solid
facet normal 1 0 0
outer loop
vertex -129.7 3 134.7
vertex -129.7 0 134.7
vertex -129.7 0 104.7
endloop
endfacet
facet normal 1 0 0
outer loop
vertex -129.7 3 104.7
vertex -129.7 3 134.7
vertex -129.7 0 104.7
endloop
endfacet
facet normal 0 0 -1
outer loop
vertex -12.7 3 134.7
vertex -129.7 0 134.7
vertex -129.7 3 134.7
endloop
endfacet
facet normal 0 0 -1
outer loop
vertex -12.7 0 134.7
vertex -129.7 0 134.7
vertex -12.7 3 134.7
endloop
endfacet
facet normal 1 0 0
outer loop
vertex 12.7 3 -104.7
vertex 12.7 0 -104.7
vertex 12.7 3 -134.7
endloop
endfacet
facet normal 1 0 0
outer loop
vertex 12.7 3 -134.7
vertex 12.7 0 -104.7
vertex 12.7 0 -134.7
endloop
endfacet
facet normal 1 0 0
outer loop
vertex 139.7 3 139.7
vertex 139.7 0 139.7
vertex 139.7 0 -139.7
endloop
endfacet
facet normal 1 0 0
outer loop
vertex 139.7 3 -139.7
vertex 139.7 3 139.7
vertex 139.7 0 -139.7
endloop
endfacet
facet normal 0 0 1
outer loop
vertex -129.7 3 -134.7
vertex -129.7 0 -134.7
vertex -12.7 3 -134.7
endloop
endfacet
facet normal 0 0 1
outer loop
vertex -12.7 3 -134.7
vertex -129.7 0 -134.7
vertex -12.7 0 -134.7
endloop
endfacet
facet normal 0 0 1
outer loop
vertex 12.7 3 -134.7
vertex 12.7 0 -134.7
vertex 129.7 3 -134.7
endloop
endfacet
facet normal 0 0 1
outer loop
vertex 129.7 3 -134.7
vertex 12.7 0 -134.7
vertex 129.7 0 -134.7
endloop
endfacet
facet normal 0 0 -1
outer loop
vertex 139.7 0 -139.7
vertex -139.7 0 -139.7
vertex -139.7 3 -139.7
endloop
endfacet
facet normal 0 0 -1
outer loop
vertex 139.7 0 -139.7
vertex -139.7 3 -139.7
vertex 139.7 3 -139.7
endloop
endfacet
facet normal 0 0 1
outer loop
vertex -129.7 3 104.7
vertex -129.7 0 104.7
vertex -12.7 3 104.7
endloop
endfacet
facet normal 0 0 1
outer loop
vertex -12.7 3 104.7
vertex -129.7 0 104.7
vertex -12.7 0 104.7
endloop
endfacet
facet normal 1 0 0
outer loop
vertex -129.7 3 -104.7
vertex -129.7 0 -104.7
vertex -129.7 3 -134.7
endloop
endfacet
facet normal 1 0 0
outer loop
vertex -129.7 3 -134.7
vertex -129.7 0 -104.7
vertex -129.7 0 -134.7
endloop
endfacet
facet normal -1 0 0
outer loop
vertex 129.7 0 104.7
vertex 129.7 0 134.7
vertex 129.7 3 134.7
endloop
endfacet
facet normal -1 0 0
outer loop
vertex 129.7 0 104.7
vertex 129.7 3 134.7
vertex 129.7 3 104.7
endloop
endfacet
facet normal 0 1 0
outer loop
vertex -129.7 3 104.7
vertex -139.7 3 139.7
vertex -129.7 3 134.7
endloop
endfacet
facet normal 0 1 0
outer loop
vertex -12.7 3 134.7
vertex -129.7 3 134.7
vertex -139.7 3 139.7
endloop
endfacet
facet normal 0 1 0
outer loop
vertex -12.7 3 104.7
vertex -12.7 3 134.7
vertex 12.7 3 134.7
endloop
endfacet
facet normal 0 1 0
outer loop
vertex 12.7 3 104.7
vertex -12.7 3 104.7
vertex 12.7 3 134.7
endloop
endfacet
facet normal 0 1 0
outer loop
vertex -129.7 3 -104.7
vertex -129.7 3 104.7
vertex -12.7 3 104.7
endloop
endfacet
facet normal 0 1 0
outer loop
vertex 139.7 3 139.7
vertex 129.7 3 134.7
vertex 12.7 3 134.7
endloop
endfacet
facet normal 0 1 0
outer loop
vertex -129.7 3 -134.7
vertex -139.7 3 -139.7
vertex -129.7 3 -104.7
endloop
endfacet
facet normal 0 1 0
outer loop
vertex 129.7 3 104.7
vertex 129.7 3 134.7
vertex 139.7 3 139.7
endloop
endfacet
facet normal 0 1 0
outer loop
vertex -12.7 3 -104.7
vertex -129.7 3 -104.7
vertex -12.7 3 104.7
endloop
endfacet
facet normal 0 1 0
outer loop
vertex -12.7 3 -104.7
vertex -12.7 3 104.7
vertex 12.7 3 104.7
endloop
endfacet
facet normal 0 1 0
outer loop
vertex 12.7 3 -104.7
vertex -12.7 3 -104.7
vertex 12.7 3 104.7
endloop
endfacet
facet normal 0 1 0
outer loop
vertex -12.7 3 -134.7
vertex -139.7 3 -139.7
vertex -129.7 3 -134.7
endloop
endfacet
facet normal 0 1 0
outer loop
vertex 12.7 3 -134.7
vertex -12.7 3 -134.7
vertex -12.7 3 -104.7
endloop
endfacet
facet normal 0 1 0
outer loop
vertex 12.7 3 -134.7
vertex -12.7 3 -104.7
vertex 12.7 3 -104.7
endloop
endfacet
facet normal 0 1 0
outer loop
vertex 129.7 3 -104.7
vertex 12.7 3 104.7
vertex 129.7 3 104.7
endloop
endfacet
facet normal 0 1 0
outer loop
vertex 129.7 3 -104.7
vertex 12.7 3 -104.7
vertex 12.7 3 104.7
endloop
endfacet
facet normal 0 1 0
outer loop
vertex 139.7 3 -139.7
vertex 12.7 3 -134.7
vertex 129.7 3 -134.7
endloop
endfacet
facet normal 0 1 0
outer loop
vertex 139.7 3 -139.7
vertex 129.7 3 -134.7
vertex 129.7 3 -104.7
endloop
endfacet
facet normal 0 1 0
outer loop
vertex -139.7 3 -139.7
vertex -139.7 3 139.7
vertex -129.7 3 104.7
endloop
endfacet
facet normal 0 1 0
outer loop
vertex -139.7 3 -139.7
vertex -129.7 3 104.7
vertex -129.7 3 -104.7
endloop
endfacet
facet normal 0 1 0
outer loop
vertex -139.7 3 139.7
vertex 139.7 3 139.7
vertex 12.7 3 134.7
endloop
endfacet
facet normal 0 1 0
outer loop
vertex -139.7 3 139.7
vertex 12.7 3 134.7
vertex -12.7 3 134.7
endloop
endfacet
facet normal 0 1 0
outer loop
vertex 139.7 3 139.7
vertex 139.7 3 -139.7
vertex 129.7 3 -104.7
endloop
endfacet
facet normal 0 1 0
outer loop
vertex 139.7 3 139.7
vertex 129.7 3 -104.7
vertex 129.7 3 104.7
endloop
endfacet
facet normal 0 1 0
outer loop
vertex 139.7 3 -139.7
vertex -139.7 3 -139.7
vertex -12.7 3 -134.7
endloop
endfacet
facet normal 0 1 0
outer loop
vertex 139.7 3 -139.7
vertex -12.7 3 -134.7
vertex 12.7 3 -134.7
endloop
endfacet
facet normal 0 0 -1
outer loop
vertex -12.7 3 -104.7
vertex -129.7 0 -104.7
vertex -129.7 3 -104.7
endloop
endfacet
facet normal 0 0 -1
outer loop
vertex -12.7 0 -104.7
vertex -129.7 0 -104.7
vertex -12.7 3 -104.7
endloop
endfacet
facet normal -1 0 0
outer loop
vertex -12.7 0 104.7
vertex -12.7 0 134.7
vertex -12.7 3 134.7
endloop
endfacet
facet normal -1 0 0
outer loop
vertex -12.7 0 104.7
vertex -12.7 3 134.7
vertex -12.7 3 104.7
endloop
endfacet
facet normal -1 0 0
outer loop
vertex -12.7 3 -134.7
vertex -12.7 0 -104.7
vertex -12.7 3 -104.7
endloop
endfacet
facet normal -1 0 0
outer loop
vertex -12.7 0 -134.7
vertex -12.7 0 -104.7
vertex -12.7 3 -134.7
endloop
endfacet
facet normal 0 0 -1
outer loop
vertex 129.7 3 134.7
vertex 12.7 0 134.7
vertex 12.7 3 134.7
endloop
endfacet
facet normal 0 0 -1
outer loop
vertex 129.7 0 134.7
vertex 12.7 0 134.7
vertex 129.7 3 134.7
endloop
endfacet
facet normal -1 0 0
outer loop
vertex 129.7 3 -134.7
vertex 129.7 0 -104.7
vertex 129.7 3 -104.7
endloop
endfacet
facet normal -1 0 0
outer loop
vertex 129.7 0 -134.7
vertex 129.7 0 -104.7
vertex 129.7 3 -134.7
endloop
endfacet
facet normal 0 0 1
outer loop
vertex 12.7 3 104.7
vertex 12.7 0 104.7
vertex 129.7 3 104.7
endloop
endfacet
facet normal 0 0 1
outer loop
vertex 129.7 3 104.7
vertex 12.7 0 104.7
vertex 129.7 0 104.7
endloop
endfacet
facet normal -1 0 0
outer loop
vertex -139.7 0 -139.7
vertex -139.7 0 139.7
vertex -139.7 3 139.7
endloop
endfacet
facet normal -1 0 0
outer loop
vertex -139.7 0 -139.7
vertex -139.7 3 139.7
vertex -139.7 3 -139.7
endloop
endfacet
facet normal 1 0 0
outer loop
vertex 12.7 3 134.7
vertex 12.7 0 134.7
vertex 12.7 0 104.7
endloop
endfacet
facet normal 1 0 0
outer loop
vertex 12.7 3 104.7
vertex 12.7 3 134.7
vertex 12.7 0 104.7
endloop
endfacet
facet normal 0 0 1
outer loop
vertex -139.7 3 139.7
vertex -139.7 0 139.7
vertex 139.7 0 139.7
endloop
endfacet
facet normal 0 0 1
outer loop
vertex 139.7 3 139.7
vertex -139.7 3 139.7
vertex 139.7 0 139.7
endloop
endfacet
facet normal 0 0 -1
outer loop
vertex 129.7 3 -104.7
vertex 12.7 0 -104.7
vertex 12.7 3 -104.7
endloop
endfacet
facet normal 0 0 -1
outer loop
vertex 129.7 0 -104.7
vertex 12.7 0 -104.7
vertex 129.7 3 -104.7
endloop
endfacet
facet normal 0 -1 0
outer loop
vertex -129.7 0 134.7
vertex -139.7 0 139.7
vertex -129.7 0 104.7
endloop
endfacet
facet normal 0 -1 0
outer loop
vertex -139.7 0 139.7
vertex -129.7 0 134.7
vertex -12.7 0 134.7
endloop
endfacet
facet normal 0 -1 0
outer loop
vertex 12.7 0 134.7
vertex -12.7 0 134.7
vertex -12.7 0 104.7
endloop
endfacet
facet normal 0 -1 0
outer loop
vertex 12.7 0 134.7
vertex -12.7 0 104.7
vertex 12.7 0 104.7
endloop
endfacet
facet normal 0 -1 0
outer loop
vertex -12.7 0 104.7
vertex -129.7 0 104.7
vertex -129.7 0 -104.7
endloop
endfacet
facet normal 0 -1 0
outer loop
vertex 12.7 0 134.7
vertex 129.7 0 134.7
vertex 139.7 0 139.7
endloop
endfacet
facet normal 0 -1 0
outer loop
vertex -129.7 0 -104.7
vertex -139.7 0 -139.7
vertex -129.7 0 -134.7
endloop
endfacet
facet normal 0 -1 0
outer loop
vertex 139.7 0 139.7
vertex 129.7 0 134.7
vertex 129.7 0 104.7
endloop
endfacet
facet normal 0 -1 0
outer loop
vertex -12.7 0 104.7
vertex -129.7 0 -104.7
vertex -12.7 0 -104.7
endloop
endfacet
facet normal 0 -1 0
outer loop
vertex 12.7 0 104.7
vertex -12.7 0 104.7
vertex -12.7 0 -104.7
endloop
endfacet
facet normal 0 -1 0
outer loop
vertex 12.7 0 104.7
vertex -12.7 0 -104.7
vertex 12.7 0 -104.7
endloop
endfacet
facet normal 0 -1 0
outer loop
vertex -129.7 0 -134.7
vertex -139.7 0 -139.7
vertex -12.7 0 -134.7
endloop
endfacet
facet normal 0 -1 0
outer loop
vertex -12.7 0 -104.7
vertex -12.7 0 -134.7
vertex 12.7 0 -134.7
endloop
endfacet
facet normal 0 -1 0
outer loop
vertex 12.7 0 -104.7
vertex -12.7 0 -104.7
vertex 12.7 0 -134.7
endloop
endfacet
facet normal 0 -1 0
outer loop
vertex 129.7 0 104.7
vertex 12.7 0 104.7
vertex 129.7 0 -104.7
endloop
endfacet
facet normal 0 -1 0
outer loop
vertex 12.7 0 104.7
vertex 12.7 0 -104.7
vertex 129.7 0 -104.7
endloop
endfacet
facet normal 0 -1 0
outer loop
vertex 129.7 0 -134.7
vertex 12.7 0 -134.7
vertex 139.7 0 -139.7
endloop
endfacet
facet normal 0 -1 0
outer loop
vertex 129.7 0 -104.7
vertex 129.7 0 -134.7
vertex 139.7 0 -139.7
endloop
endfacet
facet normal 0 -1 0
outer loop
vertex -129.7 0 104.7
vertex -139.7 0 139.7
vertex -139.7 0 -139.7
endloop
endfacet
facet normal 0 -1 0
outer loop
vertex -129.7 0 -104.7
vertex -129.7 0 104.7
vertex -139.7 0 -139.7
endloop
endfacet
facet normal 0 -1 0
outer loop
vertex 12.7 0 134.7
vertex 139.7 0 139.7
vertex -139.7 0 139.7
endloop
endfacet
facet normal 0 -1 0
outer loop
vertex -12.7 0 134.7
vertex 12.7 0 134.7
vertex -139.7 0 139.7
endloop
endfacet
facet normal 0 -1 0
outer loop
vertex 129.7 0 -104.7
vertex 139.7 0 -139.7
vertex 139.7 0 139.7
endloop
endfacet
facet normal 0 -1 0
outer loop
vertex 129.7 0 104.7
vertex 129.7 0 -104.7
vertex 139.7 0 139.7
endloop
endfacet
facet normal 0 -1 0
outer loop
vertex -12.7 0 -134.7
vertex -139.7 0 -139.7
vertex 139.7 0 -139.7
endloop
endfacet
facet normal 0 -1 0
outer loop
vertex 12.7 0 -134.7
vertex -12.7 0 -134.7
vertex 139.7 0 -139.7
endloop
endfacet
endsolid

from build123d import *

# Parameters (mm, degrees)
SKETCH1_W           = 279.4
SKETCH1_H           = 279.4
SKETCH1_W_2         = 117
SKETCH1_H_2         = 30
BOSS_EXTRUDE1_DEPTH = 3


with BuildPart() as part:
    # Sketch1 → Boss-Extrude1 (new body)
    with BuildSketch(Plane(origin=(0, 0, 0), x_dir=(1, 0, 0), z_dir=(0, 1, 0))):
        Rectangle(SKETCH1_W, SKETCH1_H)
        with Locations((-71.2, 119.7)):
            Rectangle(SKETCH1_W_2, SKETCH1_H_2, mode=Mode.SUBTRACT)
        with Locations((71.2, 119.7)):
            Rectangle(SKETCH1_W_2, SKETCH1_H_2, mode=Mode.SUBTRACT)
        with Locations((71.2, -119.7)):
            Rectangle(SKETCH1_W_2, SKETCH1_H_2, mode=Mode.SUBTRACT)
        with Locations((-71.2, -119.7)):
            Rectangle(SKETCH1_W_2, SKETCH1_H_2, mode=Mode.SUBTRACT)
    extrude(amount=BOSS_EXTRUDE1_DEPTH)


solid = part.part
